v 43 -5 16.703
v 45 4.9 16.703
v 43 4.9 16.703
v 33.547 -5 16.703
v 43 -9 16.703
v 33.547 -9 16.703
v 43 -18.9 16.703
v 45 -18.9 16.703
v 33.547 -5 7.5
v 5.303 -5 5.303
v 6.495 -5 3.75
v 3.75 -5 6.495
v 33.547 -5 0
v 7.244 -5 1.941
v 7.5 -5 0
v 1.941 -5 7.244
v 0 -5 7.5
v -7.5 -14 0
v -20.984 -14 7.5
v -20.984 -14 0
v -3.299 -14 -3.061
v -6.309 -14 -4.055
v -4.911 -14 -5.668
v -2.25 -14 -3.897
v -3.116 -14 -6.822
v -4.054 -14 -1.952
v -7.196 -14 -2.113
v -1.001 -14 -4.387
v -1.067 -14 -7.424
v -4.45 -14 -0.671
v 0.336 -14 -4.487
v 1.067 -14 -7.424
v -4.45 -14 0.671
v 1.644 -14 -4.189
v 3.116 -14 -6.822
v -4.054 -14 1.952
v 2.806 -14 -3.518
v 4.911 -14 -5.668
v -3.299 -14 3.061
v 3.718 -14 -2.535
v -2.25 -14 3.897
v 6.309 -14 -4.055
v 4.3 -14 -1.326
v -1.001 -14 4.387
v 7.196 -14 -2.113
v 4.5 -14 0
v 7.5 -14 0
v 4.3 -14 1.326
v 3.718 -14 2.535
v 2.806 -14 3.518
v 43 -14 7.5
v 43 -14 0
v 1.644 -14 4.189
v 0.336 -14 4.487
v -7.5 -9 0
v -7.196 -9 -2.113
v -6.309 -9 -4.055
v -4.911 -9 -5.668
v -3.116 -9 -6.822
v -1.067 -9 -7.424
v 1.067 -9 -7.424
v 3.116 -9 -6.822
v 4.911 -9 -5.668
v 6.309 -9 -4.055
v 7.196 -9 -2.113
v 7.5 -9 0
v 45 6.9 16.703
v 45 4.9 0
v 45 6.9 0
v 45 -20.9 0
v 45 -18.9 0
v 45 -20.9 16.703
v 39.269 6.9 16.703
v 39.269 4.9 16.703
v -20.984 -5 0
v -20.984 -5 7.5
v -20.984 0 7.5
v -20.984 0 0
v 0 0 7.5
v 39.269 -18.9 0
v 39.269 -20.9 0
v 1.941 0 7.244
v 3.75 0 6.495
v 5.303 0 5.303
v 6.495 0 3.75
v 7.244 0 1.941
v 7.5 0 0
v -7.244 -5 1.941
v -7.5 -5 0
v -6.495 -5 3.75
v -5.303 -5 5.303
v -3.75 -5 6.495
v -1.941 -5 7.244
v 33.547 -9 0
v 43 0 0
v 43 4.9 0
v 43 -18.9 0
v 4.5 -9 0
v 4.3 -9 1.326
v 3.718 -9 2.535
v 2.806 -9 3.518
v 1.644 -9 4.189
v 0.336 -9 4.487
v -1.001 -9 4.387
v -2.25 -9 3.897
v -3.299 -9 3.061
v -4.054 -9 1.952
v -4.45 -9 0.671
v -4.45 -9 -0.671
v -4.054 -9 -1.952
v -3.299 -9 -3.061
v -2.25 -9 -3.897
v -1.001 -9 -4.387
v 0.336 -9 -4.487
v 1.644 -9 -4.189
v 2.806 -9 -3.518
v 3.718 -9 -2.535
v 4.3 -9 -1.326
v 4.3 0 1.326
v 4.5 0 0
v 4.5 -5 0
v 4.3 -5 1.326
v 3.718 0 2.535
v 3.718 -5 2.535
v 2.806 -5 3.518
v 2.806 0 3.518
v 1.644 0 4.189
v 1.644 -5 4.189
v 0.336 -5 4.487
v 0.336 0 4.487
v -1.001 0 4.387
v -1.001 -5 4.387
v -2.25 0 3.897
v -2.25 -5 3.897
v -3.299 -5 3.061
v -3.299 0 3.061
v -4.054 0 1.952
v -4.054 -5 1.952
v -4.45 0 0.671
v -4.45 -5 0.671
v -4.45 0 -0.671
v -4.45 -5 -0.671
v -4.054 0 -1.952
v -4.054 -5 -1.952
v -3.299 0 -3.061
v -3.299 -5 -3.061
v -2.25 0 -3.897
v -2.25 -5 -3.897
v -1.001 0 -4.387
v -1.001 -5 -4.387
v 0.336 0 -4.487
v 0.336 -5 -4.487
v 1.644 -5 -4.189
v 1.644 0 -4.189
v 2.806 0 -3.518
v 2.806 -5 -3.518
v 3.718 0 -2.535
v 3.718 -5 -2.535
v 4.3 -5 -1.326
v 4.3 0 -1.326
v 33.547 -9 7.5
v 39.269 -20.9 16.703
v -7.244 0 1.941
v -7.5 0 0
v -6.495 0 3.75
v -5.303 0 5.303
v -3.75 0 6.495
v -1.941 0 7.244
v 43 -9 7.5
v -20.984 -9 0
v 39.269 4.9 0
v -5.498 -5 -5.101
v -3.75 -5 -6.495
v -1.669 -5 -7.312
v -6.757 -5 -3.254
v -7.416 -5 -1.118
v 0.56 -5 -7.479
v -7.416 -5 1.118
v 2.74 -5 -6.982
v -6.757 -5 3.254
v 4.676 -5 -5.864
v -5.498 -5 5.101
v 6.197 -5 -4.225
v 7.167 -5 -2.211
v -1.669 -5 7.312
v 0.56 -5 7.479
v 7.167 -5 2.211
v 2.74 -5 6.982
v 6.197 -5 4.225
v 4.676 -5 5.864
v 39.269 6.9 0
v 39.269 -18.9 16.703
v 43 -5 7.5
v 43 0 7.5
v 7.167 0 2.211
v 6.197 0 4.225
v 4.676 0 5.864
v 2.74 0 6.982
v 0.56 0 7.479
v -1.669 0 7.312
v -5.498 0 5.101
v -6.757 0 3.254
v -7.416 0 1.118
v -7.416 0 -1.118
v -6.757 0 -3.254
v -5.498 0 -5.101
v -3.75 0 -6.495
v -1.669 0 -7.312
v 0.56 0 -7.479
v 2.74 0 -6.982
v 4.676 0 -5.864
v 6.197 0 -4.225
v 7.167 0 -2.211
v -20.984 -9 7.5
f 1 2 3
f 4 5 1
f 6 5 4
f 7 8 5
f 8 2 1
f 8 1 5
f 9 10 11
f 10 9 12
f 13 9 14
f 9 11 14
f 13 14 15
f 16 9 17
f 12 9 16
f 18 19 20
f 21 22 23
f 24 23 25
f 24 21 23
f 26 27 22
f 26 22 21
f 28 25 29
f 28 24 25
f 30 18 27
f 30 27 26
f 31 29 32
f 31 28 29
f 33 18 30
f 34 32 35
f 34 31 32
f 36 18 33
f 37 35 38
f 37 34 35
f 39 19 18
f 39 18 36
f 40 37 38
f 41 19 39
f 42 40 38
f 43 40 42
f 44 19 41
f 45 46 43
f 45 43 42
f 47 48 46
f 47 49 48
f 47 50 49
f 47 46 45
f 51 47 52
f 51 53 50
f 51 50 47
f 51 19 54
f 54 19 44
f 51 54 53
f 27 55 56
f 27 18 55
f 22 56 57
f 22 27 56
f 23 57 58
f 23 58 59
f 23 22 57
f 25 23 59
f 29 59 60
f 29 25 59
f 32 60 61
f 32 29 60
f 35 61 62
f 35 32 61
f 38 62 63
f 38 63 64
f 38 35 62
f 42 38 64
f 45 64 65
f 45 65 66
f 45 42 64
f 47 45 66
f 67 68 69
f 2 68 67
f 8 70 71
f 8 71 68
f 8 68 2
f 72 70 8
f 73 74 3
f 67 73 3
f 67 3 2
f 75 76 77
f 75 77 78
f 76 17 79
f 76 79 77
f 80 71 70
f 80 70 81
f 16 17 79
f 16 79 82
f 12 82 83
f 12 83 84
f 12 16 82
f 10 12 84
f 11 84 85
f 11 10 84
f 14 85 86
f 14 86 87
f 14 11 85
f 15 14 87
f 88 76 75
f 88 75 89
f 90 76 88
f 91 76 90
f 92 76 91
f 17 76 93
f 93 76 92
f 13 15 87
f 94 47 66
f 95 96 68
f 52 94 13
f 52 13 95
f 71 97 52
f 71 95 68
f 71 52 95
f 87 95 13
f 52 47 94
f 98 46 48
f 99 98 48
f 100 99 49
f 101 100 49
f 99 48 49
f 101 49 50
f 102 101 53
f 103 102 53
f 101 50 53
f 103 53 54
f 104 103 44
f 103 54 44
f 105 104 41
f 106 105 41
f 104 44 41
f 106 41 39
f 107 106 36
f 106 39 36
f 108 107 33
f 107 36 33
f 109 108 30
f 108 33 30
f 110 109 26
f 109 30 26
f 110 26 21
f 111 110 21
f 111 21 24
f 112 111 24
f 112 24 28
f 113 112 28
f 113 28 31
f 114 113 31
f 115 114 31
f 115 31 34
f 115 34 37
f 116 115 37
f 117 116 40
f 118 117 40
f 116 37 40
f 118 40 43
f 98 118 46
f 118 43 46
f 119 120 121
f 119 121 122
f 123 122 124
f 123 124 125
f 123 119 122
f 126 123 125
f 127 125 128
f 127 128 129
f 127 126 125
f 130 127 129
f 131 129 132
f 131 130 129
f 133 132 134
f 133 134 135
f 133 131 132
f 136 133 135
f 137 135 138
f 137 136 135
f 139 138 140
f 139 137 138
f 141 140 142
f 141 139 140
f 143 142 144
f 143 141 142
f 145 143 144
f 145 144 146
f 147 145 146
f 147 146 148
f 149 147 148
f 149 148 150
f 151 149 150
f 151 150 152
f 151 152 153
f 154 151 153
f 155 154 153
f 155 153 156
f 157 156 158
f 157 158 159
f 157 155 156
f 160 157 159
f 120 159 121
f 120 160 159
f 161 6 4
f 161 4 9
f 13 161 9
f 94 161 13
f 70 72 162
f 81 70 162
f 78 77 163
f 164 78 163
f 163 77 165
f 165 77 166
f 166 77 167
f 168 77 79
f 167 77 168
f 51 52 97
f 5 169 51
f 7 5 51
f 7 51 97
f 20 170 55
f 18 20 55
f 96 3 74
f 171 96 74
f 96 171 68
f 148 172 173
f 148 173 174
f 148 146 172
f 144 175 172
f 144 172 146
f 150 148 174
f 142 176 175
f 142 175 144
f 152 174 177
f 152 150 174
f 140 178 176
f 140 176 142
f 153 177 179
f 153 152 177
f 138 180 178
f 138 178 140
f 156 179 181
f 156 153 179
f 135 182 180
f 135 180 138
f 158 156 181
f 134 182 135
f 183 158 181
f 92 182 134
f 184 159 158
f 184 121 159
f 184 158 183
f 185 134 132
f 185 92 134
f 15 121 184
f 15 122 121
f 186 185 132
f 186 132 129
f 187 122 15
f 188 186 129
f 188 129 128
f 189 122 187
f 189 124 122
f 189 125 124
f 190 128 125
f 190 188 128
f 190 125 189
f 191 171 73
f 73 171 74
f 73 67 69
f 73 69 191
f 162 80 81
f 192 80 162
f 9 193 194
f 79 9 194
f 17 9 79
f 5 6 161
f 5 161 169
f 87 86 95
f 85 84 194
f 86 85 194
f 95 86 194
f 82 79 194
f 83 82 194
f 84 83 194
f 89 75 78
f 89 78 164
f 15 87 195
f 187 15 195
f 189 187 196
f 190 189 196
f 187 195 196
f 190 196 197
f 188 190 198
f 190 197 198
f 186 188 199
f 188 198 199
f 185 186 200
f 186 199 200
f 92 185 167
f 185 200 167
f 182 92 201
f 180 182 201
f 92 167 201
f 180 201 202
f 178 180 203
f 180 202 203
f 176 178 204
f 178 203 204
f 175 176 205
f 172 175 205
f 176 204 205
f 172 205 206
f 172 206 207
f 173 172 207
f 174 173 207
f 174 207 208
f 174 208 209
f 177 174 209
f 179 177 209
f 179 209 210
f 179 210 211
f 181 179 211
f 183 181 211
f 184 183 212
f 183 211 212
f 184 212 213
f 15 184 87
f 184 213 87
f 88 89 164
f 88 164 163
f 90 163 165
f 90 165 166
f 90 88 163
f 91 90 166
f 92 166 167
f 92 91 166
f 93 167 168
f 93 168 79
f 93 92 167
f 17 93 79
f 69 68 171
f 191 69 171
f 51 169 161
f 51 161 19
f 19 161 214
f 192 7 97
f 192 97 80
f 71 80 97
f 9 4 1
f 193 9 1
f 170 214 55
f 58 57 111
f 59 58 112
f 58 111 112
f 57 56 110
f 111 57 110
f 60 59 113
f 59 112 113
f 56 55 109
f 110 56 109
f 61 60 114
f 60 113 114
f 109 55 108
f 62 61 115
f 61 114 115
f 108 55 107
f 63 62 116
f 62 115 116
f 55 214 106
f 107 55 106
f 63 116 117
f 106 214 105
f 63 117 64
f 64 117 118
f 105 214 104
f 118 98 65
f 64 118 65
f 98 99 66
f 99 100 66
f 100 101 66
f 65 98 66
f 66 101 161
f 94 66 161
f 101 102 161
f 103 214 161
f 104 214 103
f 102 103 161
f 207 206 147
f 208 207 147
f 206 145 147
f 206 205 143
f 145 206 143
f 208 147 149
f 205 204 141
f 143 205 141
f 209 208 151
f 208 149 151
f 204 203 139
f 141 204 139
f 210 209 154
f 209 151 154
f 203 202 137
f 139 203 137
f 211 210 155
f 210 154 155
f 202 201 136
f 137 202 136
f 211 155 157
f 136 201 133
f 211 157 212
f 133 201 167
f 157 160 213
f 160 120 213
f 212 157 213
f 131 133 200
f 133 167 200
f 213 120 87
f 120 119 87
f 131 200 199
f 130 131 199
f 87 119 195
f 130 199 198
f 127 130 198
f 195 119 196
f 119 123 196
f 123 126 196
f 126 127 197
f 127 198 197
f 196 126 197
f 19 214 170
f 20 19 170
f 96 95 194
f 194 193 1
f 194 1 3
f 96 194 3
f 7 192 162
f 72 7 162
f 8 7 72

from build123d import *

# Parameters (mm, degrees)
F0_R     = 7.5
F0_R_2   = 4.5
F1_DEPTH = 5
F3_DEPTH = 5
F4_W     = 5
F4_H     = 7.5
F5_DEPTH = 2
F6_W     = 3.731436
F6_H     = 16.702701
F6_W_2   = 2
F7_DEPTH = 2
F9_DEPTH = 2


with BuildPart() as f1:
    # F0 (on Front) → F1 (new body)
    with BuildSketch(Plane.XZ):
        Circle(F0_R)
        Circle(F0_R_2, mode=Mode.SUBTRACT)
    extrude(amount=F1_DEPTH)


with BuildPart() as f3:
    # F2 (on face) → F3 (new body)
    with BuildSketch(Plane.XZ.offset(5)):
        with BuildLine():
            ThreePointArc((-7.5, 0), (-5.303301, 5.303301), (0, 7.5))
            Line((0, 7.5), (-20.984, 7.5))
            Line((-20.984, 7.5), (-20.984, 0))
            Line((-20.984, 0), (-7.5, 0))
        make_face()
        with BuildLine():
            ThreePointArc((0, 7.5), (5.303301, 5.303301), (7.5, 0))
            Line((7.5, 0), (43, 0))
            Line((43, 0), (43, 7.5))
            Line((43, 7.5), (0, 7.5))
        make_face()
    extrude(amount=-F3_DEPTH)

    # F4 (on face) → F5 (join)
    with BuildSketch(Plane.YZ.offset(43)):
        Polygon((0, 7.5), (0, 0), (4.9, 0), (4.9, 16.702701), (-5, 16.702701), (-5, 7.5), align=None)
        with Locations((-2.5, 3.75)):
            Rectangle(F4_W, F4_H)
    extrude(amount=F5_DEPTH)

    # F6 (on face) → F7 (join)
    with BuildSketch(Plane(origin=(0, 4.9, 0), x_dir=(-1, 0, 0), z_dir=(0, 1, 0))):
        with Locations((-41.134282, 8.35135)):
            Rectangle(F6_W, F6_H)
        with Locations((-44, 8.35135)):
            Rectangle(F6_W_2, F6_H)
    extrude(amount=F7_DEPTH)

    # F8 (on face) → F9 (join)
    with BuildSketch(Plane.XZ.offset(5)):
        Polygon((33.546664, 0), (45, 0), (45, 16.702701), (43, 16.702701), (33.546664, 16.702701), align=None)
    extrude(amount=F9_DEPTH)

    # F10: F3, F1 across face


with BuildPart() as f3_1:
    add(f3.part)
    add(f3.part.mirror(Plane(origin=(39.273332, -7, 8.35135), x_dir=(1, 0, 0), z_dir=(0, -1, 0))))
    add(f1.part.mirror(Plane(origin=(39.273332, -7, 8.35135), x_dir=(1, 0, 0), z_dir=(0, -1, 0))))


solid = Compound([f1.part, f3_1.part])
